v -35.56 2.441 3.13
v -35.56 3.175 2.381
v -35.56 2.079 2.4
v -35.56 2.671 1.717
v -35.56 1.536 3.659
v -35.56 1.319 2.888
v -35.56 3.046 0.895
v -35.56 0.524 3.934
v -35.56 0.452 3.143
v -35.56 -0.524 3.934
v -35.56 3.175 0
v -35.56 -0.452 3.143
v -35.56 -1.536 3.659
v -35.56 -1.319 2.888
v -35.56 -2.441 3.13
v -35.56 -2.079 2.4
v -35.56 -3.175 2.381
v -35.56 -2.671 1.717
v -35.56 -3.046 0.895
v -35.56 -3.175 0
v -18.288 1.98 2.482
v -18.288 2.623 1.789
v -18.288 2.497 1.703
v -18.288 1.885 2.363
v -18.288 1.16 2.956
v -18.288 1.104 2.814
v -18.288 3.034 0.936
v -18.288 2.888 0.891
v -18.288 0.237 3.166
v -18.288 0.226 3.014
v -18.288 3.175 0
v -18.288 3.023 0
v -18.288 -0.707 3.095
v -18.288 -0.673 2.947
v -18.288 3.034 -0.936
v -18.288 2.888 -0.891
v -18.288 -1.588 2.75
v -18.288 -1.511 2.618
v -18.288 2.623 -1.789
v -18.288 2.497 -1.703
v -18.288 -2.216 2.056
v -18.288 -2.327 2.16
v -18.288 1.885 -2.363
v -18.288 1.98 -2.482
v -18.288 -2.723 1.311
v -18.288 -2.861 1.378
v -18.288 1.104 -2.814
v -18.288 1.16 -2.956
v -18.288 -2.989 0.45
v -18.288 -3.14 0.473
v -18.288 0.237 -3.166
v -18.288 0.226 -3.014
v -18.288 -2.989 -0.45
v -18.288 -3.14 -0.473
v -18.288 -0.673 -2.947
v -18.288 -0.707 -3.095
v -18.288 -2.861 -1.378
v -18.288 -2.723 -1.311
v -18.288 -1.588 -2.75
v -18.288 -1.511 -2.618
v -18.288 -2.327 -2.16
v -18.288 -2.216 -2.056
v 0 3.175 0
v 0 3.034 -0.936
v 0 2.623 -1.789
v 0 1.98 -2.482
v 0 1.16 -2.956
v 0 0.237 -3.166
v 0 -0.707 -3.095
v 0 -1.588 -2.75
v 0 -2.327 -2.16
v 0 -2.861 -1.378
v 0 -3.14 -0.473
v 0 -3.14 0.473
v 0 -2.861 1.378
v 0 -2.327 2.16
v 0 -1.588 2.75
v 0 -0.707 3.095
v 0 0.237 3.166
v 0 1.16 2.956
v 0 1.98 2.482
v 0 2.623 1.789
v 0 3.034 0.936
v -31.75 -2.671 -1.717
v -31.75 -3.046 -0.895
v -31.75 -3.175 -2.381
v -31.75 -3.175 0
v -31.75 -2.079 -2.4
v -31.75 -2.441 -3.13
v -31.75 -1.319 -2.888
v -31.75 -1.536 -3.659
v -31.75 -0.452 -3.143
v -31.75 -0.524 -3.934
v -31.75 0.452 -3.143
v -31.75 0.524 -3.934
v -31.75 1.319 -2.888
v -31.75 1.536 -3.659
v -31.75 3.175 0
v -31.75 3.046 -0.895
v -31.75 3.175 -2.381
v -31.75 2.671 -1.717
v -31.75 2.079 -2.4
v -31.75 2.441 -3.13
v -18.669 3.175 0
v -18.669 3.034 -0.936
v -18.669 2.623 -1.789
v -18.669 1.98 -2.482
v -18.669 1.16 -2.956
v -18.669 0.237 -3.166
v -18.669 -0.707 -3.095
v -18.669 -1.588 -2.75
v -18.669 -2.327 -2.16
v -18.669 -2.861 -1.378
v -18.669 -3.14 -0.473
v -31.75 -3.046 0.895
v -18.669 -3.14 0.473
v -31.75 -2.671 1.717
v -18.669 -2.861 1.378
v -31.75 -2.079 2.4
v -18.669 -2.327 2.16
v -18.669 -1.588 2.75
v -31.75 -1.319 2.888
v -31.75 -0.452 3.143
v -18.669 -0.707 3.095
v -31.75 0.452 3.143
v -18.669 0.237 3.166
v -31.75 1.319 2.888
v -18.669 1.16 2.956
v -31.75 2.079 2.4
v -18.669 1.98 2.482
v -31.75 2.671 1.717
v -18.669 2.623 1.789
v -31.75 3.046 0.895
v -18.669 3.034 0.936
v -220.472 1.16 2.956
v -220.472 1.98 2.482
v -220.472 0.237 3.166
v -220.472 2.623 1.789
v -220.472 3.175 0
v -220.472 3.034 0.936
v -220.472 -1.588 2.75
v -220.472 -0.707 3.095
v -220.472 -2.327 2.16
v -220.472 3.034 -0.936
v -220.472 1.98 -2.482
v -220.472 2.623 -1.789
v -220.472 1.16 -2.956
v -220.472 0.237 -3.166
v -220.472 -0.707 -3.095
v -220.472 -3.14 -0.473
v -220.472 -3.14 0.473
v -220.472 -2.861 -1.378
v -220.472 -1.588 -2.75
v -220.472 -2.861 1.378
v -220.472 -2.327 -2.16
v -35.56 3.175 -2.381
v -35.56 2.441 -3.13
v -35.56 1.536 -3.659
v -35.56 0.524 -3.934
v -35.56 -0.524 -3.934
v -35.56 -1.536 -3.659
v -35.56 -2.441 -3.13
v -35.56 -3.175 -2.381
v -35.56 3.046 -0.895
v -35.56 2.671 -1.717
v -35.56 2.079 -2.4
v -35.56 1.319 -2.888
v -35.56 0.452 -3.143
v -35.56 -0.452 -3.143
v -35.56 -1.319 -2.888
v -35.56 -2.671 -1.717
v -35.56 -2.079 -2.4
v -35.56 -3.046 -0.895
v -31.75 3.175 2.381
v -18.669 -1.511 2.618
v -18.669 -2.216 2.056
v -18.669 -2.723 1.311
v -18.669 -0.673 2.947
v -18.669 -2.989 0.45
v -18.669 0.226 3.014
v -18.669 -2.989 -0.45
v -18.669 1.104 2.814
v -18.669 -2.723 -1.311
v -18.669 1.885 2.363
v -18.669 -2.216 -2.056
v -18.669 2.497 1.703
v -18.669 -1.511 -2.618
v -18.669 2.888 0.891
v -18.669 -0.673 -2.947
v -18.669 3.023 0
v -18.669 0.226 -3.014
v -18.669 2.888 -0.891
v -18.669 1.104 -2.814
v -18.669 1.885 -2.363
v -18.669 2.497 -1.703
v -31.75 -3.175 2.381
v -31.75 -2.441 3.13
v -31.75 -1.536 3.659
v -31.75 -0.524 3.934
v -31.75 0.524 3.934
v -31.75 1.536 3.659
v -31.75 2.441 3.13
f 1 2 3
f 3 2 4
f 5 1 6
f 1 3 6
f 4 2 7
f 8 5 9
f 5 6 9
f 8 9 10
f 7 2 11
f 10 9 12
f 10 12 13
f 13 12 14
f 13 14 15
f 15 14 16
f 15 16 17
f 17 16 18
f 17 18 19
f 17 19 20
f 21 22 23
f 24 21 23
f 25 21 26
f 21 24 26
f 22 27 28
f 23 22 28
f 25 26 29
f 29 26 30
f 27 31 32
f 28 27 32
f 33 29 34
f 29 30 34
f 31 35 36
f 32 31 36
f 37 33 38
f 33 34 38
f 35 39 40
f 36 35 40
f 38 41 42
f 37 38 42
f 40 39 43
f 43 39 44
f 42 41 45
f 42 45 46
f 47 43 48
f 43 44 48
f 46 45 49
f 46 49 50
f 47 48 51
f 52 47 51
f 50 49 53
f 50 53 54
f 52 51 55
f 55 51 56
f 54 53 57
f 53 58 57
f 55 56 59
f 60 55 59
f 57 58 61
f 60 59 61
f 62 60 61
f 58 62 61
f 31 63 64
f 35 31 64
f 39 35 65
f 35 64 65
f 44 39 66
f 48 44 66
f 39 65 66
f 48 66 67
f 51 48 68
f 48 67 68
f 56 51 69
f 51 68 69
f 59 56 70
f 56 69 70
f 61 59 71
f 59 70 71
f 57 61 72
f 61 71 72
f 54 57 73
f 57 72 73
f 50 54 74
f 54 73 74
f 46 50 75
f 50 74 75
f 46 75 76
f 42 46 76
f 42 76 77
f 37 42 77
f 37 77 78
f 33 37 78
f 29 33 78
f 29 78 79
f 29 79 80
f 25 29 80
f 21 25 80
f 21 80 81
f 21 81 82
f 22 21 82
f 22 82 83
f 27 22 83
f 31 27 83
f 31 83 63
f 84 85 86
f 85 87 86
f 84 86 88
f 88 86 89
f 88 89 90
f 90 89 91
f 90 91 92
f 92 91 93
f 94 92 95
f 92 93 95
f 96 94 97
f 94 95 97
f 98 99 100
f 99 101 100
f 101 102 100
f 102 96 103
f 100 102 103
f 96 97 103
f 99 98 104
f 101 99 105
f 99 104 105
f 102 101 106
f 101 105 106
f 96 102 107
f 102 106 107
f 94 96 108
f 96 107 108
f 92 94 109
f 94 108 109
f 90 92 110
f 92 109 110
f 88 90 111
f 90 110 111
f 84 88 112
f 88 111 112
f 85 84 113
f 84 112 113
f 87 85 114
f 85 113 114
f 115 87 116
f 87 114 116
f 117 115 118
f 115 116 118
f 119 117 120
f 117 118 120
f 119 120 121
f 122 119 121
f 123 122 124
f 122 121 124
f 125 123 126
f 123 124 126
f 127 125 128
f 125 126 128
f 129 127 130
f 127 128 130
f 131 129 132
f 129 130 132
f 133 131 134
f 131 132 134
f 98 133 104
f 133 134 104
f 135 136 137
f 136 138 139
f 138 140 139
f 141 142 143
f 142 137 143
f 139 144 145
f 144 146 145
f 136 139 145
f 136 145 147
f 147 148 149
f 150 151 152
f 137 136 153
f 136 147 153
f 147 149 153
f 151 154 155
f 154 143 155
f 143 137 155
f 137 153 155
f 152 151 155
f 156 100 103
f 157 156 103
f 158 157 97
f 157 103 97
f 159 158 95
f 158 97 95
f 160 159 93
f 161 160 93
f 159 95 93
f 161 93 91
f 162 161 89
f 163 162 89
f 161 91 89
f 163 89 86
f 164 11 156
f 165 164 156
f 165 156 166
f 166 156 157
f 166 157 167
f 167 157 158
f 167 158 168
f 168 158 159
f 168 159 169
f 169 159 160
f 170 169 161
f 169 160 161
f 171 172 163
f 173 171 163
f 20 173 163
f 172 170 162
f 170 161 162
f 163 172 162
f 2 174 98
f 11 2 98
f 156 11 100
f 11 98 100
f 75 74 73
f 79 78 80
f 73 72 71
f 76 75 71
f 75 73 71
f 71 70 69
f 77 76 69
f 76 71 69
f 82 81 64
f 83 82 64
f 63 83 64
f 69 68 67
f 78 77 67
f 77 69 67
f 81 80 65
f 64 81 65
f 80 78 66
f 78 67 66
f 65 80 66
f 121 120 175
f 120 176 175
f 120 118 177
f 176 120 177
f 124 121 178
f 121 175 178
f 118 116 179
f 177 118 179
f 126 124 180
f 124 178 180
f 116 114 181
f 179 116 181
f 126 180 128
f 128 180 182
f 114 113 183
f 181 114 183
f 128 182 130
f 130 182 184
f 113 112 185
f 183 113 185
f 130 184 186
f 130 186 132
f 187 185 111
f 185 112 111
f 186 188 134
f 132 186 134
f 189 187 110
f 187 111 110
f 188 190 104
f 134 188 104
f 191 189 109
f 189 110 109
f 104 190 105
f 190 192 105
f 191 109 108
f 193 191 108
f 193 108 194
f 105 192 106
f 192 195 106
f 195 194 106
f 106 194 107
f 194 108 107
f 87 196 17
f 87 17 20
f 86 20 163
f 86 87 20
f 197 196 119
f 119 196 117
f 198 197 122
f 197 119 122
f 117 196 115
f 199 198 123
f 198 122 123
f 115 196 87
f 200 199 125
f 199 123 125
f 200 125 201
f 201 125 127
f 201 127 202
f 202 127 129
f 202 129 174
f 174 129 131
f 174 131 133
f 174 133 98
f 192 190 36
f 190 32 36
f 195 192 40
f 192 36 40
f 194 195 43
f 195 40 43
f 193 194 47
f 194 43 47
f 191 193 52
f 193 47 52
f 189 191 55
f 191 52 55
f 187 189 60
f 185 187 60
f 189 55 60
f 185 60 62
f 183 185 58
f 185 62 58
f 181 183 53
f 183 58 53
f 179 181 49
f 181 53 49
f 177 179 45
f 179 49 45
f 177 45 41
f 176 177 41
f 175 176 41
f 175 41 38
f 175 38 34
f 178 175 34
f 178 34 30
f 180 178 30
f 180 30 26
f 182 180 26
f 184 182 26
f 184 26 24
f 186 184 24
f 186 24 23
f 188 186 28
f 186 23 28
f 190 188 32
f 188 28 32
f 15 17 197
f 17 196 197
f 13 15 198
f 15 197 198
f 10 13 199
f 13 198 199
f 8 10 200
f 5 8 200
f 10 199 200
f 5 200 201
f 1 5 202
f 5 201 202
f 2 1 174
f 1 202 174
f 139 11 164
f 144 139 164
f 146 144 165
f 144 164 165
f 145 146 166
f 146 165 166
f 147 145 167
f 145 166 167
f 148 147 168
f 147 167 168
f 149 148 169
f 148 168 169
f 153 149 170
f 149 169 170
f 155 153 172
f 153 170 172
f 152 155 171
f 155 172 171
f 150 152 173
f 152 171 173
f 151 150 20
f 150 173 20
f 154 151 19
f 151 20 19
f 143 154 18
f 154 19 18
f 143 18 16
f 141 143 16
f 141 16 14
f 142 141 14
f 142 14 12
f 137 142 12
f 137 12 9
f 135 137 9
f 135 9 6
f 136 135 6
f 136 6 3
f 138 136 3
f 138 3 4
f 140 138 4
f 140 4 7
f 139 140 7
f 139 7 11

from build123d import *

# Parameters (mm, degrees)
SKETCH2_OUTSIDE_W   = 54.09
SKETCH2_OUTSIDE_H   = 54.09
SKETCH2_OUTSIDE_W_2 = 7.9375
SKETCH2_OUTSIDE_H_2 = 6.35
CUT_EXTRUDE1_DEPTH  = 221.472


with BuildPart() as part:
    # Sketch1 → Revolve1 (revolve)
    with BuildSketch(Plane.XY):
        Polygon((0, 0), (-220.472, 0), (-220.472, 3.175), (-35.56, 3.175), (-35.56, 3.96875), (-31.75, 3.96875), (-31.75, 3.175), (-18.669, 3.175), (-18.669, 3.0226), (-18.288, 3.0226), (-18.288, 3.175), (0, 3.175), align=None)
    revolve(axis=Axis((0, 0, 0), (-1, 0, 0)))

    # Sketch2 outside → Cut-Extrude1 (cut, through all)
    with BuildSketch(Plane(origin=(0, 0, 0), x_dir=(0, 0, -1), z_dir=(1, 0, 0))):
        Rectangle(SKETCH2_OUTSIDE_W, SKETCH2_OUTSIDE_H)
        Rectangle(SKETCH2_OUTSIDE_W_2, SKETCH2_OUTSIDE_H_2, mode=Mode.SUBTRACT)
    extrude(amount=-CUT_EXTRUDE1_DEPTH, mode=Mode.SUBTRACT)


solid = part.part
